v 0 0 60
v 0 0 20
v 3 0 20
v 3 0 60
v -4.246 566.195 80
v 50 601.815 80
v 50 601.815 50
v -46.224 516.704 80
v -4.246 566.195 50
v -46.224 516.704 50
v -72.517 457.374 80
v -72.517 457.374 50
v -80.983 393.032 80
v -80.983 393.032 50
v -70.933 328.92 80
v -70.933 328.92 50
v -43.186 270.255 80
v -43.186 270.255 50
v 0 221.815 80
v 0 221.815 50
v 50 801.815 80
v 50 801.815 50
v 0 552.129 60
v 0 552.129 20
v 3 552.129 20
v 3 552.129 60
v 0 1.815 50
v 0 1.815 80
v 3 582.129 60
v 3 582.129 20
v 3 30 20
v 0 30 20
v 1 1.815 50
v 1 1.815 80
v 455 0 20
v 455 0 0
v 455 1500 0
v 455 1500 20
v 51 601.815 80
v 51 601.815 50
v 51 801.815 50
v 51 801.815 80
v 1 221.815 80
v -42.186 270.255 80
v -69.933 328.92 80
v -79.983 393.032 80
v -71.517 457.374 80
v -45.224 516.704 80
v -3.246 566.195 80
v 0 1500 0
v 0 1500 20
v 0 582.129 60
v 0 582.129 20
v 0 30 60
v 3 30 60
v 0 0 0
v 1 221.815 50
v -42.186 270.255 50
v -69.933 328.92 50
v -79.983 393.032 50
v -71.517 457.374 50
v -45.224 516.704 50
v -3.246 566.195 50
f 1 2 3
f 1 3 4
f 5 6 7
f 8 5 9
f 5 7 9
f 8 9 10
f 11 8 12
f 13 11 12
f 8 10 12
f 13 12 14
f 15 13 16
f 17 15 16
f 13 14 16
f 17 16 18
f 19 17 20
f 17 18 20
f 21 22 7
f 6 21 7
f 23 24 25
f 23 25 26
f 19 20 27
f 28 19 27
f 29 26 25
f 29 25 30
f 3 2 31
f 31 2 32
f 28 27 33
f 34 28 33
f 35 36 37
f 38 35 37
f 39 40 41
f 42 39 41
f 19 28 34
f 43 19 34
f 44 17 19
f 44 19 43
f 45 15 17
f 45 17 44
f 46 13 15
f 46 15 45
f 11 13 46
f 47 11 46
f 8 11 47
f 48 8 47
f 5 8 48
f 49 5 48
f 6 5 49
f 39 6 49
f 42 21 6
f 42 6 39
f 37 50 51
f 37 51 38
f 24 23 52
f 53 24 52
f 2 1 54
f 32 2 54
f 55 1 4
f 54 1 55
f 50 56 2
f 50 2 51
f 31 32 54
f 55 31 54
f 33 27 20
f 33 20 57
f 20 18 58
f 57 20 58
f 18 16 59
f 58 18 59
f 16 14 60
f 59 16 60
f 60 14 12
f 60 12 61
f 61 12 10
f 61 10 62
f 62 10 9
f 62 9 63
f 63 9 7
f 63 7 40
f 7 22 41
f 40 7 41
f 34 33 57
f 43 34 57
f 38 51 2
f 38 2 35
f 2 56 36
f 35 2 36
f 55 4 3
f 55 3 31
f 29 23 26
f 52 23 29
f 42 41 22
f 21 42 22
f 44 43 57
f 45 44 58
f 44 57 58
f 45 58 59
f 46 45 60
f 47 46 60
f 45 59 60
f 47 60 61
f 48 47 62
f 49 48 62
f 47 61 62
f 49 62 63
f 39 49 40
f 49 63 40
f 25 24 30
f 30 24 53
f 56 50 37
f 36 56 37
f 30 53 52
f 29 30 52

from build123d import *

# Parameters (mm, degrees)
F0_W     = 455
F0_H     = 1500
F1_DEPTH = 20
F7_DEPTH = 30
F8_W     = 30
F8_H     = 40
F9_DEPTH = 3


with BuildPart() as f1:
    # F0 (on Top) → F1 (new body)
    with BuildSketch(Plane.XY):
        with Locations((227.5, 750)):
            Rectangle(F0_W, F0_H)
    extrude(amount=F1_DEPTH)


with BuildPart() as f7:
    # F6 (on offset) → F7 (new body)
    with BuildSketch(Plane.XY.offset(50)):
        with BuildLine():
            Line((50, 801.814826), (50, 601.814826))
            ThreePointArc((50, 601.814826), (-79.056404, 425.506458), (0, 221.814826))
            Line((0, 221.814826), (0, 1.814826))
            Line((0, 1.814826), (1, 1.814826))
            Line((1, 1.814826), (1, 221.814826))
            ThreePointArc((1, 221.814826), (-78.056404, 425.506458), (51, 601.814826))
            Line((51, 601.814826), (51, 801.814826))
            Line((51, 801.814826), (50, 801.814826))
        make_face()
    extrude(amount=F7_DEPTH)


with BuildPart() as f9:
    # F8 (on Right) → F9 (new body)
    with BuildSketch(Plane.YZ):
        with Locations((15, 40)):
            Rectangle(F8_W, F8_H)
        with Locations((567.128553, 40)):
            Rectangle(F8_W, F8_H)
    extrude(amount=F9_DEPTH)


solid = Compound([f1.part, f7.part, f9.part])
